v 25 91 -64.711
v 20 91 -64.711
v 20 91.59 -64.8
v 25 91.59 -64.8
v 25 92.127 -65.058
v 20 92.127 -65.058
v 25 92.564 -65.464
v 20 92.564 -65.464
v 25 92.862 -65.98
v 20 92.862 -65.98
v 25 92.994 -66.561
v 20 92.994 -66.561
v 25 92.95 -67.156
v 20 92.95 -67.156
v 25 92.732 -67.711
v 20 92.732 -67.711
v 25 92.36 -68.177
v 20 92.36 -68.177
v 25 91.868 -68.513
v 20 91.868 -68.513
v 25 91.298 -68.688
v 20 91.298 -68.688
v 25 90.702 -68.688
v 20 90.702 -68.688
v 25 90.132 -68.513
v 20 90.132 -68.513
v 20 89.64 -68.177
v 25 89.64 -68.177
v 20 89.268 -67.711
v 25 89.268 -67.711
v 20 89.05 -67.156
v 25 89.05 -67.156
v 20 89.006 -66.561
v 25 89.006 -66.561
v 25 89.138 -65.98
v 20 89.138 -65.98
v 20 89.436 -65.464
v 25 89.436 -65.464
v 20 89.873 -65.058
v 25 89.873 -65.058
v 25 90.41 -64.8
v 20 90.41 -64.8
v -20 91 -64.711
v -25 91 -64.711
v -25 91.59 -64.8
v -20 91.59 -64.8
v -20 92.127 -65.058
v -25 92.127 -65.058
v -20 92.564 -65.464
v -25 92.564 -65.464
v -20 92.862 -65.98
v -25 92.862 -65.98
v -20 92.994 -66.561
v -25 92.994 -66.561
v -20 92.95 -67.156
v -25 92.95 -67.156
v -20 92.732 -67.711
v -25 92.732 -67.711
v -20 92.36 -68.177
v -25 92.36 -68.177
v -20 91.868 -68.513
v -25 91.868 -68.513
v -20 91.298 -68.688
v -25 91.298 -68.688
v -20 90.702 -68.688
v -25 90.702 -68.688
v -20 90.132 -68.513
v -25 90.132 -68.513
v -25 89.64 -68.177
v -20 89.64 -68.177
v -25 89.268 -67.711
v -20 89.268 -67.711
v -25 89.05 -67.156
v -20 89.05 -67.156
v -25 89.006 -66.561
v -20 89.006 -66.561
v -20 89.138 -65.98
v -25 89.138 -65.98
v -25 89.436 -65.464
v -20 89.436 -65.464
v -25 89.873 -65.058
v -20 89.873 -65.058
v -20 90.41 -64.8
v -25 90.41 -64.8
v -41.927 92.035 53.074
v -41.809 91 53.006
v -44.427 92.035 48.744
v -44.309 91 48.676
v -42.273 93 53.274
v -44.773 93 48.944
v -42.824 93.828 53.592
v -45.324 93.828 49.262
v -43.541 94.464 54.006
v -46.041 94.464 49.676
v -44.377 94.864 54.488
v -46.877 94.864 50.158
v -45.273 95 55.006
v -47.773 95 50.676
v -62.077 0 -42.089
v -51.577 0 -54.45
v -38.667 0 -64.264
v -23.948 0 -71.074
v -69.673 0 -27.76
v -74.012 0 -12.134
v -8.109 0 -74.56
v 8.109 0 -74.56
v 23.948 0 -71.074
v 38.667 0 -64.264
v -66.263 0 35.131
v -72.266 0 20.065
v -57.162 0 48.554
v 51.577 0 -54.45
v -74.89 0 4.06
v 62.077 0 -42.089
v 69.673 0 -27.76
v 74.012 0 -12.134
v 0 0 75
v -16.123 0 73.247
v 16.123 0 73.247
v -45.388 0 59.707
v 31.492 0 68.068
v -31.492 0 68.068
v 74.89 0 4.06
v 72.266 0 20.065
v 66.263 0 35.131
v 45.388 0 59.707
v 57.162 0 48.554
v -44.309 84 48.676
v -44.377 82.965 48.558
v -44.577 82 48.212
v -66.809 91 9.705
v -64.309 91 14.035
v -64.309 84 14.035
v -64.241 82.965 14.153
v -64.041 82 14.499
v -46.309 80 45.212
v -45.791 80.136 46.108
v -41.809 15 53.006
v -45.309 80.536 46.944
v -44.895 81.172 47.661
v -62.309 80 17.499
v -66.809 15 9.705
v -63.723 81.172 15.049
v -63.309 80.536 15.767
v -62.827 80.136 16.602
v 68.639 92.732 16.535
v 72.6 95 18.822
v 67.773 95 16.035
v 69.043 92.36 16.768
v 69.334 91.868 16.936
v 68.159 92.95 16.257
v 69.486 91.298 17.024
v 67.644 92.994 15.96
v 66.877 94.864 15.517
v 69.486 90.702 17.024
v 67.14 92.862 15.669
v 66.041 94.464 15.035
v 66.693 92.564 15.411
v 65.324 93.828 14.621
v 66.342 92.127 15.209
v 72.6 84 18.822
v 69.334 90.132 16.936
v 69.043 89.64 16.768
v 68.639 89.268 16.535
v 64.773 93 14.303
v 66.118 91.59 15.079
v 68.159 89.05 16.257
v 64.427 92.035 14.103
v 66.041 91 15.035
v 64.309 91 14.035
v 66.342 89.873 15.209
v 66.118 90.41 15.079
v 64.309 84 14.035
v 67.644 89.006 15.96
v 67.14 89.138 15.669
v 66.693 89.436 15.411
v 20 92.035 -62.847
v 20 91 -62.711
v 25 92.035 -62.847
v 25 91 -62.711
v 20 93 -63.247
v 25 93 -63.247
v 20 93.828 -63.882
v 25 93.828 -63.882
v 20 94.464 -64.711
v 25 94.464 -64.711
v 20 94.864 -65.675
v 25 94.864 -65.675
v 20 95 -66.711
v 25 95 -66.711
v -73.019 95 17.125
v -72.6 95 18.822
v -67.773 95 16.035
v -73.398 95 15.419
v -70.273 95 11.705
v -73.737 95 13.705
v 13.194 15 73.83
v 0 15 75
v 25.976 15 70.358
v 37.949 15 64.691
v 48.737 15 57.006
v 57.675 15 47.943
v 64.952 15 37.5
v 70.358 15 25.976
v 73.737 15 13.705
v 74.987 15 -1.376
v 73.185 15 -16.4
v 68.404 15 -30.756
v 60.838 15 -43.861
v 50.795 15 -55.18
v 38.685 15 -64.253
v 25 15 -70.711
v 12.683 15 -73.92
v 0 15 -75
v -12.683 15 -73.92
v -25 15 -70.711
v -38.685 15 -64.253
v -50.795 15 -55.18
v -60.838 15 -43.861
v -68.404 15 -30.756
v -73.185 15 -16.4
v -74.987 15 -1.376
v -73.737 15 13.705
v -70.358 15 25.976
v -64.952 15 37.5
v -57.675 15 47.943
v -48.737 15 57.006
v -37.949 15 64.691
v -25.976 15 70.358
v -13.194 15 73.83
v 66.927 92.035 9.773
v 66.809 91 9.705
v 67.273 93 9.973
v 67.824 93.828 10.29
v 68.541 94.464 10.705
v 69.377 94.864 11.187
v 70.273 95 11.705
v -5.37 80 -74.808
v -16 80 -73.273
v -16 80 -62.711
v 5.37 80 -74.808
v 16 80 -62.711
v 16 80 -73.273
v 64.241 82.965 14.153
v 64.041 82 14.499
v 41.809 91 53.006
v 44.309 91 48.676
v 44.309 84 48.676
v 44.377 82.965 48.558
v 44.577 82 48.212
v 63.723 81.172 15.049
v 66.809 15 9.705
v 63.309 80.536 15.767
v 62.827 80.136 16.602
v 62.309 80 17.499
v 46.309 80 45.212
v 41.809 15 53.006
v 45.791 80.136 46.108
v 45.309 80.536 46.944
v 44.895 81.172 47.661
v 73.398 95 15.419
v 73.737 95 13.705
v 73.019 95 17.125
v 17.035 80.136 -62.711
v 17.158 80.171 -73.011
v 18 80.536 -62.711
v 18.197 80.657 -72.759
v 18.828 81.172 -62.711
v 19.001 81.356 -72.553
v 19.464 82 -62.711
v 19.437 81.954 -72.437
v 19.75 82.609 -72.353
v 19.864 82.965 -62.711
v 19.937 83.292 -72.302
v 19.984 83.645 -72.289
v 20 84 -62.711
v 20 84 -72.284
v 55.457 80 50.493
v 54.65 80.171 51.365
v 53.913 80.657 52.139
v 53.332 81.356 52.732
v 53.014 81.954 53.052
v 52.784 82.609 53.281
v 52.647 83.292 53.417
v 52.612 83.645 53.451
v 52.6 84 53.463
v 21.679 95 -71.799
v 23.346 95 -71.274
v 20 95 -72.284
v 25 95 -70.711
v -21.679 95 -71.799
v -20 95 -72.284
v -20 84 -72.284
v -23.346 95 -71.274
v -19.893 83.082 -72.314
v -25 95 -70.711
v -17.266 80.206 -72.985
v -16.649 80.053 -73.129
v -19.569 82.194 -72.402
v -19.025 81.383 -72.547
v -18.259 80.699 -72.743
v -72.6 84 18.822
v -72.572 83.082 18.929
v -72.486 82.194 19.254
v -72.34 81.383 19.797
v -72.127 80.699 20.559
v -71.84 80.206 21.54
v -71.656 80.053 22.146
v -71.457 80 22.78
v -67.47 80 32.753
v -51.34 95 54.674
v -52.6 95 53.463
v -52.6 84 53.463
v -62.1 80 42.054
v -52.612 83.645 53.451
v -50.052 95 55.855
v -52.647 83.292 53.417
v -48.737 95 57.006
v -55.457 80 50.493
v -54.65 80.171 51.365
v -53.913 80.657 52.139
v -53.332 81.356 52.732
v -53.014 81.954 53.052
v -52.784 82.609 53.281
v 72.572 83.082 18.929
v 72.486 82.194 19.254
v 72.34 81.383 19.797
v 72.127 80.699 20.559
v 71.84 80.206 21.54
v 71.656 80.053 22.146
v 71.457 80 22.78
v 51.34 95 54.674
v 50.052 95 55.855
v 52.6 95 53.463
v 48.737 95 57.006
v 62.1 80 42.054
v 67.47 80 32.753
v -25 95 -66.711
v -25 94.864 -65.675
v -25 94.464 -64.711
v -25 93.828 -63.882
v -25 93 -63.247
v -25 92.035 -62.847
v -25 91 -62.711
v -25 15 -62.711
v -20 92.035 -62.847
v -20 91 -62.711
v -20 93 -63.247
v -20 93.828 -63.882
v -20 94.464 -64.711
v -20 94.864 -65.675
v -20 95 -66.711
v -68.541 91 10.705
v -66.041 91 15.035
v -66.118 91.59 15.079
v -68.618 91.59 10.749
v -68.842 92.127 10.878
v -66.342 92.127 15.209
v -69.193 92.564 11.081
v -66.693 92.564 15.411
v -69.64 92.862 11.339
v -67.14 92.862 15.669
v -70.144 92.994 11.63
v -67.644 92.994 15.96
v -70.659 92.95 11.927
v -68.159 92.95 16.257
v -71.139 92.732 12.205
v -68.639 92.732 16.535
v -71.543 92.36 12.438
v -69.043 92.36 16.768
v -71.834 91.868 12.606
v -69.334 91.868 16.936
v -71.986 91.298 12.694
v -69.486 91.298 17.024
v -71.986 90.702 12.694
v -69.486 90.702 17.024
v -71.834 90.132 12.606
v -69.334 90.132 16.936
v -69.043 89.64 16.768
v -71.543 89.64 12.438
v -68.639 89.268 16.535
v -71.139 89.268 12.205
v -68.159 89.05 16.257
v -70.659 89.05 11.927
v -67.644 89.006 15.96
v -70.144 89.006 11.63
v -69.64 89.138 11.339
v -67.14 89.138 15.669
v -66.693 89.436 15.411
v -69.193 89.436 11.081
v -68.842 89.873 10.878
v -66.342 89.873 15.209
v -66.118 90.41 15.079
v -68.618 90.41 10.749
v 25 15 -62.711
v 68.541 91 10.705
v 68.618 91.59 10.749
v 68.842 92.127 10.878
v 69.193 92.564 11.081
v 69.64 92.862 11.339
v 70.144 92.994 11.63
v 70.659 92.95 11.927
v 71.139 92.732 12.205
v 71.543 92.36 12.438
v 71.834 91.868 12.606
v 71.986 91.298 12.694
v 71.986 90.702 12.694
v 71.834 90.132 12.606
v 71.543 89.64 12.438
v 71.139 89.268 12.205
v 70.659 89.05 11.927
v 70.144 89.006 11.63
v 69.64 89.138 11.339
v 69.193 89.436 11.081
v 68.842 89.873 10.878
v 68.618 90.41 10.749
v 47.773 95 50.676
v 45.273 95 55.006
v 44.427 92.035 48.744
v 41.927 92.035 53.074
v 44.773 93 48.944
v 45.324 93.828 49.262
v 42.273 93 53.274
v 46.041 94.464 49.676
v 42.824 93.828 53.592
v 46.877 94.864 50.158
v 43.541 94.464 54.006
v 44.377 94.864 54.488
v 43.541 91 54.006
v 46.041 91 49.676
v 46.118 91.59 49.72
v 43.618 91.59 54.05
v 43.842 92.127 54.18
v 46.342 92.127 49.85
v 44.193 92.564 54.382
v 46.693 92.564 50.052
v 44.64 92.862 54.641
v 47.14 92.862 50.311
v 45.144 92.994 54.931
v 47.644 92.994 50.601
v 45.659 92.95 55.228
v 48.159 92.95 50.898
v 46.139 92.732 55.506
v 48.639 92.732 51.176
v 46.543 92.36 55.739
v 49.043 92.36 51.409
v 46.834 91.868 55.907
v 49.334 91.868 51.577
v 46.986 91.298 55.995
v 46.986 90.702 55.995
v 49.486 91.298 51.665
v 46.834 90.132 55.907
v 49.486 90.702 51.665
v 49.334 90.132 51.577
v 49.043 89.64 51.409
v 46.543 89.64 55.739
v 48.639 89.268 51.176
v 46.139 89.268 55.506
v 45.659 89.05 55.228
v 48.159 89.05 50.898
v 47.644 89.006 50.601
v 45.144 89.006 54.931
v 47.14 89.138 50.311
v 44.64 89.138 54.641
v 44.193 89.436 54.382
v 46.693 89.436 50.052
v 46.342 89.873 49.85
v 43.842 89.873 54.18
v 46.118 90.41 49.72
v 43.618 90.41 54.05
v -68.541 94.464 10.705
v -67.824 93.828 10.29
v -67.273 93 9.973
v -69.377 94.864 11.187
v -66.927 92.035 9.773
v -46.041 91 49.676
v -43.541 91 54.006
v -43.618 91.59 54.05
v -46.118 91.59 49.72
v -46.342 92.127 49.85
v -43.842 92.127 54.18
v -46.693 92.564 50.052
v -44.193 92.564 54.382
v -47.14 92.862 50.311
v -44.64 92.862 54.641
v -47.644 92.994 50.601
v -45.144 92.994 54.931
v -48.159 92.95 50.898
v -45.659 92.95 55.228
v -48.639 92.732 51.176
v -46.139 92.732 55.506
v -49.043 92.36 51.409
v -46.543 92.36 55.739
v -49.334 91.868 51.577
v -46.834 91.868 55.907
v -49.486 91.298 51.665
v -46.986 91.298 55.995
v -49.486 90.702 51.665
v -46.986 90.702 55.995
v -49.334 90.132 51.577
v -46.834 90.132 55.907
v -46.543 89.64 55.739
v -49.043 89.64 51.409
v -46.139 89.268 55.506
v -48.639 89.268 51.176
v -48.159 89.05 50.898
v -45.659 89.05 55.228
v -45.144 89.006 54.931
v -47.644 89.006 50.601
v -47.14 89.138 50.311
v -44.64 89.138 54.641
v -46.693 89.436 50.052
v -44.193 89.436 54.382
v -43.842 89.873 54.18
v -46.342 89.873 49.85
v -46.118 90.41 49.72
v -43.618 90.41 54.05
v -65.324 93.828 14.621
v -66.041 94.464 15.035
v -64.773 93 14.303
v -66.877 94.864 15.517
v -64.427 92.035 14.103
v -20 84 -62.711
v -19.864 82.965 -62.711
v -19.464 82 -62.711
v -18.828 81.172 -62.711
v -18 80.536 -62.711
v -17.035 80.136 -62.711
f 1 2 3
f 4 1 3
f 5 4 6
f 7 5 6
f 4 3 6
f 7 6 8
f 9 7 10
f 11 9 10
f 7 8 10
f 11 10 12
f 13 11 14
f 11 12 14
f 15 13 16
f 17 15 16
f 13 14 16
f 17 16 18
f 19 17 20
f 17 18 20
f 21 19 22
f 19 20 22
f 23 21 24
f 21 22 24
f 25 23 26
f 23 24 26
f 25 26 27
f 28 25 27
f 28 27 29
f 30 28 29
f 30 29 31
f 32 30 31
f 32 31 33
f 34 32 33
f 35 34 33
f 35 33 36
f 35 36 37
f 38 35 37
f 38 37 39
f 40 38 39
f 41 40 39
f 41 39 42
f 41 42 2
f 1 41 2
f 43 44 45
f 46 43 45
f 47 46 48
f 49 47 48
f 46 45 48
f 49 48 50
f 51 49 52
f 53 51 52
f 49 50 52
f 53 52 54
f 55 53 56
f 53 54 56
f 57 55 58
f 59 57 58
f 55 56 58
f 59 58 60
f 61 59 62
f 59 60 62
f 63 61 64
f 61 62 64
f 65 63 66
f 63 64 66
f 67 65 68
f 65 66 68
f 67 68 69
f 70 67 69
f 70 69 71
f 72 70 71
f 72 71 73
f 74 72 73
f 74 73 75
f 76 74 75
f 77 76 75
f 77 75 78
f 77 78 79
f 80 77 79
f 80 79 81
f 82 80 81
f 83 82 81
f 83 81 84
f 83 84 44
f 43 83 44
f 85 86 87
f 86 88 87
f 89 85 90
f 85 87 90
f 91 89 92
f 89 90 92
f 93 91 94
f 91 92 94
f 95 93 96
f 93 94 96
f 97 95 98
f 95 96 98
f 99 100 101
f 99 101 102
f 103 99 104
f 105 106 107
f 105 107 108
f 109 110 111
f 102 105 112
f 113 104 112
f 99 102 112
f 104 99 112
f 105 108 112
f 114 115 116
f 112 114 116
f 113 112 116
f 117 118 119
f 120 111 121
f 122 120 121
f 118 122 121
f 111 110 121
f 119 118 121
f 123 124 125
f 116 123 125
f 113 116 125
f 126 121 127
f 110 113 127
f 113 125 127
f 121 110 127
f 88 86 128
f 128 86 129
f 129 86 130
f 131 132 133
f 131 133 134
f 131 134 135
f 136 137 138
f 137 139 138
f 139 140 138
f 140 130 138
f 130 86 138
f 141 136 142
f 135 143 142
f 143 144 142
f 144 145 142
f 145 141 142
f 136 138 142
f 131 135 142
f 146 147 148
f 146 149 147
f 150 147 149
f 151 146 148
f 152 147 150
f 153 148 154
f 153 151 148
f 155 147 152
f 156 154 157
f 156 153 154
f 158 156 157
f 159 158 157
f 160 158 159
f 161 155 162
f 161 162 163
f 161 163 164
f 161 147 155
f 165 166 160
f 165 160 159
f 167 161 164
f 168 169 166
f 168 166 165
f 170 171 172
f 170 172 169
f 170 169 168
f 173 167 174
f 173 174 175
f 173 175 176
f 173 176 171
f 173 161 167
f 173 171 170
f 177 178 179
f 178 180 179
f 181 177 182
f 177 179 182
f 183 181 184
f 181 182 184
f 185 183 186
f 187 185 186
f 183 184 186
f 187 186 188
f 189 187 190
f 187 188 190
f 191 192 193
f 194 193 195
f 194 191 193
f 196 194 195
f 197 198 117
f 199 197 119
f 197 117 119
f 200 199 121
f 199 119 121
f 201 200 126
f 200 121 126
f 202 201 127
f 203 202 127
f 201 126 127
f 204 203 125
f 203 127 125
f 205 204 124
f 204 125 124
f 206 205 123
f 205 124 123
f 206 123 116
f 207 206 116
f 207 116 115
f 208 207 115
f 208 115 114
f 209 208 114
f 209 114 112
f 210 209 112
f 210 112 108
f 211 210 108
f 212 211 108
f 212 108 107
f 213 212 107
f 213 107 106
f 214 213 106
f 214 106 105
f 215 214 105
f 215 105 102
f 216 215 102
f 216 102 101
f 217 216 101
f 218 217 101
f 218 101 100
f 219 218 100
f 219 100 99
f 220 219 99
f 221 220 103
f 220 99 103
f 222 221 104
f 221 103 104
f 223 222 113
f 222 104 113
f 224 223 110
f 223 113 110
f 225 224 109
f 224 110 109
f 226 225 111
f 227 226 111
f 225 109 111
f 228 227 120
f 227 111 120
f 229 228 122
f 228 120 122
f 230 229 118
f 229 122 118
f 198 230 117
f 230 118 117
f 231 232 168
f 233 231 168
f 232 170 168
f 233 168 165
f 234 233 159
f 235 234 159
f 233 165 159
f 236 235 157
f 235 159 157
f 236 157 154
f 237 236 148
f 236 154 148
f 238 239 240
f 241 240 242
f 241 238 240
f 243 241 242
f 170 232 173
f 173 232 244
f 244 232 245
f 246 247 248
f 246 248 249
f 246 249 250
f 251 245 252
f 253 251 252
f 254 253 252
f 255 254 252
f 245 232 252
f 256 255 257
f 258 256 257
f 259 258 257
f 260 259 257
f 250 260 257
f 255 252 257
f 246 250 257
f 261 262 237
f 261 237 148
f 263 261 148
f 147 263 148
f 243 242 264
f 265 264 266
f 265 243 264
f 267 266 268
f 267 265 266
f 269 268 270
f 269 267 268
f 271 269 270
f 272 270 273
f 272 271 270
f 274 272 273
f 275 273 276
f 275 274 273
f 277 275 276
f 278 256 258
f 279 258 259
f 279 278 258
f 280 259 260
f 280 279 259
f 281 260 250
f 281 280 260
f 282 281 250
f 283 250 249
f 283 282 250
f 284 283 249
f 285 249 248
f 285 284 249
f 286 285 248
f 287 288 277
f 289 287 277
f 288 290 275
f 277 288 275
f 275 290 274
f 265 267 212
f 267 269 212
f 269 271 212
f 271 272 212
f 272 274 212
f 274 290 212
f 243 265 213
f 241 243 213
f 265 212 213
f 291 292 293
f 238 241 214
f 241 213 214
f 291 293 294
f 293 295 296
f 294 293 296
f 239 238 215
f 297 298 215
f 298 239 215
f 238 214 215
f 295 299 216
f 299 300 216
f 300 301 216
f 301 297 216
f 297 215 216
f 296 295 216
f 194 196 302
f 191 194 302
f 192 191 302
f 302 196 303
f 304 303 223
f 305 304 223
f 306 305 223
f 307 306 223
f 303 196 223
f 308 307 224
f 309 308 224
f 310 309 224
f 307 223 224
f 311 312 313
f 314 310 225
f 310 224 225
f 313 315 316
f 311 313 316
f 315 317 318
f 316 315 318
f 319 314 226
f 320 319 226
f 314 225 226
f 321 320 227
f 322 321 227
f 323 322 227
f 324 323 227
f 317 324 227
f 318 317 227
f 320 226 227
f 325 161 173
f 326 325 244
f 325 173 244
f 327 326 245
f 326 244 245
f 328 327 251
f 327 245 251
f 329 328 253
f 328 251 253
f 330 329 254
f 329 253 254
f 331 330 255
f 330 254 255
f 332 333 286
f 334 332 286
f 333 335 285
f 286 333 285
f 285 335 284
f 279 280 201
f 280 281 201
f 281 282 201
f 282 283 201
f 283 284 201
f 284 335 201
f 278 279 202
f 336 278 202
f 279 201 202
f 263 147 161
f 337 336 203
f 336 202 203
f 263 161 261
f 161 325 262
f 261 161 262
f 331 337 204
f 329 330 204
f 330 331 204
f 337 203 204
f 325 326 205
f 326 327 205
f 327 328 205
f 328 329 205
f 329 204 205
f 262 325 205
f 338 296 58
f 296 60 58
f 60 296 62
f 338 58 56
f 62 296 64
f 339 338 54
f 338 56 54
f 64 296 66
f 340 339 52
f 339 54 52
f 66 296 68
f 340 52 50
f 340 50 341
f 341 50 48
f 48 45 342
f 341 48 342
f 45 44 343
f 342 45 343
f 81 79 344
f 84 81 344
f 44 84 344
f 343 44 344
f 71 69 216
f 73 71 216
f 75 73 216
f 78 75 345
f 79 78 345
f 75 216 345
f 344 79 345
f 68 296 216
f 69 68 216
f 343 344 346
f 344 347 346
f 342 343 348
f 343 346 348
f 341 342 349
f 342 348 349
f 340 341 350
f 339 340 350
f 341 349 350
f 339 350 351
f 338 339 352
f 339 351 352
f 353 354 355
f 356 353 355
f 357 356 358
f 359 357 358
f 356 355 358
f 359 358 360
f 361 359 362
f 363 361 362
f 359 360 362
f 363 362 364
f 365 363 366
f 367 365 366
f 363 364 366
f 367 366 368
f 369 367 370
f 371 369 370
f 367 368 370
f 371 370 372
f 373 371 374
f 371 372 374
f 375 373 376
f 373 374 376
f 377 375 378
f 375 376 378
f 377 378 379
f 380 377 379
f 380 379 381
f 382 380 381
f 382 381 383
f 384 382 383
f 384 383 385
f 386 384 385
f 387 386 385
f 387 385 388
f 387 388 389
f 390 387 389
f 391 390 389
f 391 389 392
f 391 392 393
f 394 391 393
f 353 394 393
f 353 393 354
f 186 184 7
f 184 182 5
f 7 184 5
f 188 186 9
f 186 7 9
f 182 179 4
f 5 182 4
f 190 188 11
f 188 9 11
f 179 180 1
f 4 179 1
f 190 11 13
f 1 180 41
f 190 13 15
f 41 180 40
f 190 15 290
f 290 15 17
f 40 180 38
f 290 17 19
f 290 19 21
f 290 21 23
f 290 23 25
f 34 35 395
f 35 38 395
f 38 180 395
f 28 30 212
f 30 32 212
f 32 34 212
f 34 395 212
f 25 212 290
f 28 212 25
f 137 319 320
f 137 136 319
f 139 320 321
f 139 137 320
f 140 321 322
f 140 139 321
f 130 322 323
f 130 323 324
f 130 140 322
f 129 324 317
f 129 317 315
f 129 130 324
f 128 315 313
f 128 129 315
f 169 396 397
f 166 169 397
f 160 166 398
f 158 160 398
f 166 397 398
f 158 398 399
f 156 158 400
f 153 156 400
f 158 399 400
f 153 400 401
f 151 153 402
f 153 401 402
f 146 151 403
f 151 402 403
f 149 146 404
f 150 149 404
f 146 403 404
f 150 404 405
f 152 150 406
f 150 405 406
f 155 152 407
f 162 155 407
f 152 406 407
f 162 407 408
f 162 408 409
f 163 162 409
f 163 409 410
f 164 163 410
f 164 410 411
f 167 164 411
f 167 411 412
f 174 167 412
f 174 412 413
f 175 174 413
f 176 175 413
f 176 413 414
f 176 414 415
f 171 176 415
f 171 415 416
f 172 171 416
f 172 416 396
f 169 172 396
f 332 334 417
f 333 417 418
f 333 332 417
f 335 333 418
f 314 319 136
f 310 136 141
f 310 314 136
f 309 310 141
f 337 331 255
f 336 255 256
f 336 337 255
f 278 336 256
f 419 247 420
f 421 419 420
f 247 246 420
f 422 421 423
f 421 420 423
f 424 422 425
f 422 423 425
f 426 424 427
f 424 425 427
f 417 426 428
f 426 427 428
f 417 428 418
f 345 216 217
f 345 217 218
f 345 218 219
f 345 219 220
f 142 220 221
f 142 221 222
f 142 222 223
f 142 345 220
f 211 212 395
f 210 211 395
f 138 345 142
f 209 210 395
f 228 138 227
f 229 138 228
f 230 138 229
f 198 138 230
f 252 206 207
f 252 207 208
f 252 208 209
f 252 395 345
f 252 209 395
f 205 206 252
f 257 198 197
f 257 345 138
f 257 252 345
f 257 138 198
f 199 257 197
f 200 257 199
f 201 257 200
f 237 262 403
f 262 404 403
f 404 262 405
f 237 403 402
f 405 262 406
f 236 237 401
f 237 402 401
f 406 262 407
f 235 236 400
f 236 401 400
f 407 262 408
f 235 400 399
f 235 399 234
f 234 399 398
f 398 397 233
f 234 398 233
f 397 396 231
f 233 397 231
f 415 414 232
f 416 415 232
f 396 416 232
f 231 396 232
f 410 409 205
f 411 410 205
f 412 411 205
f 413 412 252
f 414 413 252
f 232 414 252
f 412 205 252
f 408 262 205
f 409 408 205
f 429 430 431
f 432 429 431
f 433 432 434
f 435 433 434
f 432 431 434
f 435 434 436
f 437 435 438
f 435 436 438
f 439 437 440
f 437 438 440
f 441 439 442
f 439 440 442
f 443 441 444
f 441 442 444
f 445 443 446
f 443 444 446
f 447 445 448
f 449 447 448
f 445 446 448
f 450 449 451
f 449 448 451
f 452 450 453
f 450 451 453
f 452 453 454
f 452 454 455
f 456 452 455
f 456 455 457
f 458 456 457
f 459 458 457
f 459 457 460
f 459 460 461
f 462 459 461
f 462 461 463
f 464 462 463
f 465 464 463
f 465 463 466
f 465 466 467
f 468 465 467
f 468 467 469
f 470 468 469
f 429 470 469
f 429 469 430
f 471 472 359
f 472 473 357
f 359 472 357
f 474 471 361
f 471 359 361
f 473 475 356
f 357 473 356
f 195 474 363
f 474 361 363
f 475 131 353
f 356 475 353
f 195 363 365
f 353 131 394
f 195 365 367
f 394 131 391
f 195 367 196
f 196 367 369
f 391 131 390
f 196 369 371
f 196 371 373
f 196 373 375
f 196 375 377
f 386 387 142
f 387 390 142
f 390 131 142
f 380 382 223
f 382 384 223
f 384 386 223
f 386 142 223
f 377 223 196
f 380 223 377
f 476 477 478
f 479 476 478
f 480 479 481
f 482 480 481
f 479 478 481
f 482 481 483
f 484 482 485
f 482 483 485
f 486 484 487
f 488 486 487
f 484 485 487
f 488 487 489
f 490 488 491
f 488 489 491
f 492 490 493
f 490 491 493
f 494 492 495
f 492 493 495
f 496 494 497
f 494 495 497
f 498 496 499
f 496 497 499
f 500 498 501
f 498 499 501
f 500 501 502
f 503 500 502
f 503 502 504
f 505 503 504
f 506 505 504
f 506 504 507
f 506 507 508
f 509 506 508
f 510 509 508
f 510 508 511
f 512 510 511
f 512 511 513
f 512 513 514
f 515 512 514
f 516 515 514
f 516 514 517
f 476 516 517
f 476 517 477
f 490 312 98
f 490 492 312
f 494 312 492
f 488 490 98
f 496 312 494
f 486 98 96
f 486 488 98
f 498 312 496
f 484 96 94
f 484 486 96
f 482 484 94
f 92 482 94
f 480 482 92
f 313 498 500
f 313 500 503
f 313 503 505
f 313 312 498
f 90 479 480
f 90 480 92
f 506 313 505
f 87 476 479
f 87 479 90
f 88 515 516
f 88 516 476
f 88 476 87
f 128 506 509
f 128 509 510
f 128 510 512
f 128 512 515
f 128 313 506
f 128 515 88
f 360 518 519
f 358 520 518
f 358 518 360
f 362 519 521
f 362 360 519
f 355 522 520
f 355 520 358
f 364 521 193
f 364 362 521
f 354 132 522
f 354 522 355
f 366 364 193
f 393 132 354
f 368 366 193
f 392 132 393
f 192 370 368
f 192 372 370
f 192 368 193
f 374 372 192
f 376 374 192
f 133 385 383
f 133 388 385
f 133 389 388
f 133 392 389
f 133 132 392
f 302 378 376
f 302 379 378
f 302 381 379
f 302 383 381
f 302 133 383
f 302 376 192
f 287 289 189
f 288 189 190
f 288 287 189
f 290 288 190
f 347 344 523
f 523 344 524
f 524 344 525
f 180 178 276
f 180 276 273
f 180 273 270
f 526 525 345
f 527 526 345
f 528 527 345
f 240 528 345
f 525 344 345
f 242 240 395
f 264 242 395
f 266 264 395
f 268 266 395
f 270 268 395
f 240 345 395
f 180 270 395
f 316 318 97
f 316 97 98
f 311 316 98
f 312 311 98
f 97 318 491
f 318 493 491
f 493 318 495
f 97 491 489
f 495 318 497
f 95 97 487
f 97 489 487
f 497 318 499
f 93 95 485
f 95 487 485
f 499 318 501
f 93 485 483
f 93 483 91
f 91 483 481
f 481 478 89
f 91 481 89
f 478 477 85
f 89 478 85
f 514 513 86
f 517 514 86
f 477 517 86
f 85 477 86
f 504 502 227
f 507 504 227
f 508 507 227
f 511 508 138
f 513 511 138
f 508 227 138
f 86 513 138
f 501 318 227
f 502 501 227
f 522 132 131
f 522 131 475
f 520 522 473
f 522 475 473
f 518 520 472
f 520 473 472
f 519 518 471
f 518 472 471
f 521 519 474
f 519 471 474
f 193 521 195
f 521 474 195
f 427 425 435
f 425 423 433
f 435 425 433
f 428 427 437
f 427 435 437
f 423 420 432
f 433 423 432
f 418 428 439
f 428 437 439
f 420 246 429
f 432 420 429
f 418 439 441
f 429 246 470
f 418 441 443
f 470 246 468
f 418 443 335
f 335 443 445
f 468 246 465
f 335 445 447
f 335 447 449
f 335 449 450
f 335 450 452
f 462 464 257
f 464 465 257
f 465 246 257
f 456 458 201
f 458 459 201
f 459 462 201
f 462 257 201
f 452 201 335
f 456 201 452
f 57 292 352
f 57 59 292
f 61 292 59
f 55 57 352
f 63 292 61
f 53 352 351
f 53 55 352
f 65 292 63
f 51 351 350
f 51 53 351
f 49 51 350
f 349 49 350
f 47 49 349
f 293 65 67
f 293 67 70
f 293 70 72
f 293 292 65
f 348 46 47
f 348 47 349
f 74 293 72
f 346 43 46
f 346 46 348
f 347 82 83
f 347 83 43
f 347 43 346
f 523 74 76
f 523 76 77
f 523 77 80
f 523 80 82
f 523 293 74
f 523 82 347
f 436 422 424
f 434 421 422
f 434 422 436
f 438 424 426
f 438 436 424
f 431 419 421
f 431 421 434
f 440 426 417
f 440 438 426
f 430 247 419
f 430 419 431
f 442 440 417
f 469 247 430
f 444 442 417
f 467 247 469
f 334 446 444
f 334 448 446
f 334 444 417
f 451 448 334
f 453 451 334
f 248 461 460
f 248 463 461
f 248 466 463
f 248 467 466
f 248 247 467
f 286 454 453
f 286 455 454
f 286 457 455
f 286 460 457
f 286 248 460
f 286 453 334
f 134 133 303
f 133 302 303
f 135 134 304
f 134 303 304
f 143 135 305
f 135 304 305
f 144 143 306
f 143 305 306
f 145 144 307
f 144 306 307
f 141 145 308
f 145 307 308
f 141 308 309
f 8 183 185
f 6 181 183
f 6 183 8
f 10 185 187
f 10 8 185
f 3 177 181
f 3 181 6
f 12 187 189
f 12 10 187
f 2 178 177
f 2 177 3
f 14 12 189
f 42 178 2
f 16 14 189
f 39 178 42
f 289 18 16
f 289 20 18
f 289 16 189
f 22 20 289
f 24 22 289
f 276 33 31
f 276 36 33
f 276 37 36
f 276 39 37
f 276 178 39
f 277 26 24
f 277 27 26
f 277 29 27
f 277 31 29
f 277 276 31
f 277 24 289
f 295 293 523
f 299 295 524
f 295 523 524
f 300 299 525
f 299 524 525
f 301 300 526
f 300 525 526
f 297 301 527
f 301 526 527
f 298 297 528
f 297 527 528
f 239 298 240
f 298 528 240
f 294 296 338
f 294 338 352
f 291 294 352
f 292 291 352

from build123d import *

# Parameters (mm, degrees)
SKETCH1_R                = 75
BOSS_EXTRUDE1_DEPTH      = 15
BOSS_EXTRUDE2_DEPTH      = 80
CUT_EXTRUDE1_START       = -15
CUT_EXTRUDE1_DEPTH       = 15
F_4_0_MM_DOWEL_HOLES1_D  = 4
FILLET1_R                = 4
FILLET2_R                = 4
CIRPATTERN1_COUNT        = 3
FILLET1_OF_CIRPATTERN1_R = 4
FILLET2_OF_CIRPATTERN1_R = 4


with BuildPart() as part:
    # Sketch1 → Boss-Extrude1 (new body)
    with BuildSketch(Plane(origin=(0, 0, 0), x_dir=(1, 0, 0), z_dir=(0, 1, 0))):
        with Locations(Location((0, 0, 0), (0, 0, 270))):
            Circle(SKETCH1_R)
    extrude(amount=BOSS_EXTRUDE1_DEPTH)

    # Sketch2 → Boss-Extrude2 (add)
    with BuildSketch(Plane(origin=(0, 15, 0), x_dir=(1, 0, 0), z_dir=(0, 1, 0))):
        with BuildLine():
            Line((-25, 70.710678119), (-25, 62.710678119))
            Line((-25, 62.710678119), (25, 62.710678119))
            Line((25, 62.710678119), (25, 70.710678119))
            ThreePointArc((25, 70.710678119), (0, 75), (-25, 70.710678119))
        make_face()
    boss_extrude2 = extrude(amount=BOSS_EXTRUDE2_DEPTH)

    # Sketch3 → Cut-Extrude1 (cut)
    with BuildSketch(Plane(origin=(0, 95, 0), x_dir=(1, 0, 0), z_dir=(0, 1, 0)).offset(CUT_EXTRUDE1_START)):
        with BuildLine():
            Line((-20, 72.284161474), (-20, 62.710678119))
            Line((-20, 62.710678119), (20, 62.710678119))
            Line((20, 62.710678119), (20, 72.284161474))
            ThreePointArc((20, 72.284161474), (0, 75), (-20, 72.284161474))
        make_face()
    cut_extrude1 = extrude(amount=CUT_EXTRUDE1_DEPTH, mode=Mode.SUBTRACT)

    # Ø4.0 mm Dowel Holes1 (through all)
    with Locations(Plane(origin=(25, 0, 0), x_dir=(0, 0, -1), z_dir=(1, 0, 0))):
        with Locations((66.710678119, 91)):
            f_4_0_mm_dowel_holes1 = Hole(F_4_0_MM_DOWEL_HOLES1_D / 2)

    # Fillet1
    fillet1_edges = [part.edges().sort_by_distance(p)[0] for p in [
        (22.5, 95, -62.710678119),
        (-22.5, 95, -62.710678119),
    ]]
    fillet(fillet1_edges, radius=FILLET1_R)

    # Fillet2
    fillet2_edges = [part.edges().sort_by_distance(p)[0] for p in [
        (20, 80, -67.497419796),
        (-20, 80, -67.497419796),
    ]]
    fillet(fillet2_edges, radius=FILLET2_R)

    # CirPattern1: Boss-Extrude2, Cut-Extrude1, Ø4.0 mm Dowel Holes1 ×3 about axis
    cirpattern1_axis = Axis((0, 0, 0), (0, 1, 0))
    add([boss_extrude2.rotate(cirpattern1_axis, i * 360 / CIRPATTERN1_COUNT) for i in range(1, CIRPATTERN1_COUNT)])
    add([cut_extrude1.rotate(cirpattern1_axis, i * 360 / CIRPATTERN1_COUNT) for i in range(1, CIRPATTERN1_COUNT)], mode=Mode.SUBTRACT)
    add([f_4_0_mm_dowel_holes1.rotate(cirpattern1_axis, i * 360 / CIRPATTERN1_COUNT) for i in range(1, CIRPATTERN1_COUNT)], mode=Mode.SUBTRACT)

    # Fillet1 of CirPattern1
    fillet1_of_cirpattern1_edges = [part.edges().sort_by_distance(p)[0] for p in [
        (-65.559040339, 95, 11.869767474),
        (-43.059040339, 95, 50.840910644),
        (43.059040339, 95, 50.840910644),
        (65.559040339, 95, 11.869767474),
    ]]
    fillet(fillet1_of_cirpattern1_edges, radius=FILLET1_OF_CIRPATTERN1_R)

    # Fillet2 of CirPattern1
    fillet2_of_cirpattern1_edges = [part.edges().sort_by_distance(p)[0] for p in [
        (-68.454480234, 80, 16.428201822),
        (-48.454480234, 80, 51.069217974),
        (48.454480234, 80, 51.069217974),
        (68.454480234, 80, 16.428201822),
    ]]
    fillet(fillet2_of_cirpattern1_edges, radius=FILLET2_OF_CIRPATTERN1_R)


solid = part.part
